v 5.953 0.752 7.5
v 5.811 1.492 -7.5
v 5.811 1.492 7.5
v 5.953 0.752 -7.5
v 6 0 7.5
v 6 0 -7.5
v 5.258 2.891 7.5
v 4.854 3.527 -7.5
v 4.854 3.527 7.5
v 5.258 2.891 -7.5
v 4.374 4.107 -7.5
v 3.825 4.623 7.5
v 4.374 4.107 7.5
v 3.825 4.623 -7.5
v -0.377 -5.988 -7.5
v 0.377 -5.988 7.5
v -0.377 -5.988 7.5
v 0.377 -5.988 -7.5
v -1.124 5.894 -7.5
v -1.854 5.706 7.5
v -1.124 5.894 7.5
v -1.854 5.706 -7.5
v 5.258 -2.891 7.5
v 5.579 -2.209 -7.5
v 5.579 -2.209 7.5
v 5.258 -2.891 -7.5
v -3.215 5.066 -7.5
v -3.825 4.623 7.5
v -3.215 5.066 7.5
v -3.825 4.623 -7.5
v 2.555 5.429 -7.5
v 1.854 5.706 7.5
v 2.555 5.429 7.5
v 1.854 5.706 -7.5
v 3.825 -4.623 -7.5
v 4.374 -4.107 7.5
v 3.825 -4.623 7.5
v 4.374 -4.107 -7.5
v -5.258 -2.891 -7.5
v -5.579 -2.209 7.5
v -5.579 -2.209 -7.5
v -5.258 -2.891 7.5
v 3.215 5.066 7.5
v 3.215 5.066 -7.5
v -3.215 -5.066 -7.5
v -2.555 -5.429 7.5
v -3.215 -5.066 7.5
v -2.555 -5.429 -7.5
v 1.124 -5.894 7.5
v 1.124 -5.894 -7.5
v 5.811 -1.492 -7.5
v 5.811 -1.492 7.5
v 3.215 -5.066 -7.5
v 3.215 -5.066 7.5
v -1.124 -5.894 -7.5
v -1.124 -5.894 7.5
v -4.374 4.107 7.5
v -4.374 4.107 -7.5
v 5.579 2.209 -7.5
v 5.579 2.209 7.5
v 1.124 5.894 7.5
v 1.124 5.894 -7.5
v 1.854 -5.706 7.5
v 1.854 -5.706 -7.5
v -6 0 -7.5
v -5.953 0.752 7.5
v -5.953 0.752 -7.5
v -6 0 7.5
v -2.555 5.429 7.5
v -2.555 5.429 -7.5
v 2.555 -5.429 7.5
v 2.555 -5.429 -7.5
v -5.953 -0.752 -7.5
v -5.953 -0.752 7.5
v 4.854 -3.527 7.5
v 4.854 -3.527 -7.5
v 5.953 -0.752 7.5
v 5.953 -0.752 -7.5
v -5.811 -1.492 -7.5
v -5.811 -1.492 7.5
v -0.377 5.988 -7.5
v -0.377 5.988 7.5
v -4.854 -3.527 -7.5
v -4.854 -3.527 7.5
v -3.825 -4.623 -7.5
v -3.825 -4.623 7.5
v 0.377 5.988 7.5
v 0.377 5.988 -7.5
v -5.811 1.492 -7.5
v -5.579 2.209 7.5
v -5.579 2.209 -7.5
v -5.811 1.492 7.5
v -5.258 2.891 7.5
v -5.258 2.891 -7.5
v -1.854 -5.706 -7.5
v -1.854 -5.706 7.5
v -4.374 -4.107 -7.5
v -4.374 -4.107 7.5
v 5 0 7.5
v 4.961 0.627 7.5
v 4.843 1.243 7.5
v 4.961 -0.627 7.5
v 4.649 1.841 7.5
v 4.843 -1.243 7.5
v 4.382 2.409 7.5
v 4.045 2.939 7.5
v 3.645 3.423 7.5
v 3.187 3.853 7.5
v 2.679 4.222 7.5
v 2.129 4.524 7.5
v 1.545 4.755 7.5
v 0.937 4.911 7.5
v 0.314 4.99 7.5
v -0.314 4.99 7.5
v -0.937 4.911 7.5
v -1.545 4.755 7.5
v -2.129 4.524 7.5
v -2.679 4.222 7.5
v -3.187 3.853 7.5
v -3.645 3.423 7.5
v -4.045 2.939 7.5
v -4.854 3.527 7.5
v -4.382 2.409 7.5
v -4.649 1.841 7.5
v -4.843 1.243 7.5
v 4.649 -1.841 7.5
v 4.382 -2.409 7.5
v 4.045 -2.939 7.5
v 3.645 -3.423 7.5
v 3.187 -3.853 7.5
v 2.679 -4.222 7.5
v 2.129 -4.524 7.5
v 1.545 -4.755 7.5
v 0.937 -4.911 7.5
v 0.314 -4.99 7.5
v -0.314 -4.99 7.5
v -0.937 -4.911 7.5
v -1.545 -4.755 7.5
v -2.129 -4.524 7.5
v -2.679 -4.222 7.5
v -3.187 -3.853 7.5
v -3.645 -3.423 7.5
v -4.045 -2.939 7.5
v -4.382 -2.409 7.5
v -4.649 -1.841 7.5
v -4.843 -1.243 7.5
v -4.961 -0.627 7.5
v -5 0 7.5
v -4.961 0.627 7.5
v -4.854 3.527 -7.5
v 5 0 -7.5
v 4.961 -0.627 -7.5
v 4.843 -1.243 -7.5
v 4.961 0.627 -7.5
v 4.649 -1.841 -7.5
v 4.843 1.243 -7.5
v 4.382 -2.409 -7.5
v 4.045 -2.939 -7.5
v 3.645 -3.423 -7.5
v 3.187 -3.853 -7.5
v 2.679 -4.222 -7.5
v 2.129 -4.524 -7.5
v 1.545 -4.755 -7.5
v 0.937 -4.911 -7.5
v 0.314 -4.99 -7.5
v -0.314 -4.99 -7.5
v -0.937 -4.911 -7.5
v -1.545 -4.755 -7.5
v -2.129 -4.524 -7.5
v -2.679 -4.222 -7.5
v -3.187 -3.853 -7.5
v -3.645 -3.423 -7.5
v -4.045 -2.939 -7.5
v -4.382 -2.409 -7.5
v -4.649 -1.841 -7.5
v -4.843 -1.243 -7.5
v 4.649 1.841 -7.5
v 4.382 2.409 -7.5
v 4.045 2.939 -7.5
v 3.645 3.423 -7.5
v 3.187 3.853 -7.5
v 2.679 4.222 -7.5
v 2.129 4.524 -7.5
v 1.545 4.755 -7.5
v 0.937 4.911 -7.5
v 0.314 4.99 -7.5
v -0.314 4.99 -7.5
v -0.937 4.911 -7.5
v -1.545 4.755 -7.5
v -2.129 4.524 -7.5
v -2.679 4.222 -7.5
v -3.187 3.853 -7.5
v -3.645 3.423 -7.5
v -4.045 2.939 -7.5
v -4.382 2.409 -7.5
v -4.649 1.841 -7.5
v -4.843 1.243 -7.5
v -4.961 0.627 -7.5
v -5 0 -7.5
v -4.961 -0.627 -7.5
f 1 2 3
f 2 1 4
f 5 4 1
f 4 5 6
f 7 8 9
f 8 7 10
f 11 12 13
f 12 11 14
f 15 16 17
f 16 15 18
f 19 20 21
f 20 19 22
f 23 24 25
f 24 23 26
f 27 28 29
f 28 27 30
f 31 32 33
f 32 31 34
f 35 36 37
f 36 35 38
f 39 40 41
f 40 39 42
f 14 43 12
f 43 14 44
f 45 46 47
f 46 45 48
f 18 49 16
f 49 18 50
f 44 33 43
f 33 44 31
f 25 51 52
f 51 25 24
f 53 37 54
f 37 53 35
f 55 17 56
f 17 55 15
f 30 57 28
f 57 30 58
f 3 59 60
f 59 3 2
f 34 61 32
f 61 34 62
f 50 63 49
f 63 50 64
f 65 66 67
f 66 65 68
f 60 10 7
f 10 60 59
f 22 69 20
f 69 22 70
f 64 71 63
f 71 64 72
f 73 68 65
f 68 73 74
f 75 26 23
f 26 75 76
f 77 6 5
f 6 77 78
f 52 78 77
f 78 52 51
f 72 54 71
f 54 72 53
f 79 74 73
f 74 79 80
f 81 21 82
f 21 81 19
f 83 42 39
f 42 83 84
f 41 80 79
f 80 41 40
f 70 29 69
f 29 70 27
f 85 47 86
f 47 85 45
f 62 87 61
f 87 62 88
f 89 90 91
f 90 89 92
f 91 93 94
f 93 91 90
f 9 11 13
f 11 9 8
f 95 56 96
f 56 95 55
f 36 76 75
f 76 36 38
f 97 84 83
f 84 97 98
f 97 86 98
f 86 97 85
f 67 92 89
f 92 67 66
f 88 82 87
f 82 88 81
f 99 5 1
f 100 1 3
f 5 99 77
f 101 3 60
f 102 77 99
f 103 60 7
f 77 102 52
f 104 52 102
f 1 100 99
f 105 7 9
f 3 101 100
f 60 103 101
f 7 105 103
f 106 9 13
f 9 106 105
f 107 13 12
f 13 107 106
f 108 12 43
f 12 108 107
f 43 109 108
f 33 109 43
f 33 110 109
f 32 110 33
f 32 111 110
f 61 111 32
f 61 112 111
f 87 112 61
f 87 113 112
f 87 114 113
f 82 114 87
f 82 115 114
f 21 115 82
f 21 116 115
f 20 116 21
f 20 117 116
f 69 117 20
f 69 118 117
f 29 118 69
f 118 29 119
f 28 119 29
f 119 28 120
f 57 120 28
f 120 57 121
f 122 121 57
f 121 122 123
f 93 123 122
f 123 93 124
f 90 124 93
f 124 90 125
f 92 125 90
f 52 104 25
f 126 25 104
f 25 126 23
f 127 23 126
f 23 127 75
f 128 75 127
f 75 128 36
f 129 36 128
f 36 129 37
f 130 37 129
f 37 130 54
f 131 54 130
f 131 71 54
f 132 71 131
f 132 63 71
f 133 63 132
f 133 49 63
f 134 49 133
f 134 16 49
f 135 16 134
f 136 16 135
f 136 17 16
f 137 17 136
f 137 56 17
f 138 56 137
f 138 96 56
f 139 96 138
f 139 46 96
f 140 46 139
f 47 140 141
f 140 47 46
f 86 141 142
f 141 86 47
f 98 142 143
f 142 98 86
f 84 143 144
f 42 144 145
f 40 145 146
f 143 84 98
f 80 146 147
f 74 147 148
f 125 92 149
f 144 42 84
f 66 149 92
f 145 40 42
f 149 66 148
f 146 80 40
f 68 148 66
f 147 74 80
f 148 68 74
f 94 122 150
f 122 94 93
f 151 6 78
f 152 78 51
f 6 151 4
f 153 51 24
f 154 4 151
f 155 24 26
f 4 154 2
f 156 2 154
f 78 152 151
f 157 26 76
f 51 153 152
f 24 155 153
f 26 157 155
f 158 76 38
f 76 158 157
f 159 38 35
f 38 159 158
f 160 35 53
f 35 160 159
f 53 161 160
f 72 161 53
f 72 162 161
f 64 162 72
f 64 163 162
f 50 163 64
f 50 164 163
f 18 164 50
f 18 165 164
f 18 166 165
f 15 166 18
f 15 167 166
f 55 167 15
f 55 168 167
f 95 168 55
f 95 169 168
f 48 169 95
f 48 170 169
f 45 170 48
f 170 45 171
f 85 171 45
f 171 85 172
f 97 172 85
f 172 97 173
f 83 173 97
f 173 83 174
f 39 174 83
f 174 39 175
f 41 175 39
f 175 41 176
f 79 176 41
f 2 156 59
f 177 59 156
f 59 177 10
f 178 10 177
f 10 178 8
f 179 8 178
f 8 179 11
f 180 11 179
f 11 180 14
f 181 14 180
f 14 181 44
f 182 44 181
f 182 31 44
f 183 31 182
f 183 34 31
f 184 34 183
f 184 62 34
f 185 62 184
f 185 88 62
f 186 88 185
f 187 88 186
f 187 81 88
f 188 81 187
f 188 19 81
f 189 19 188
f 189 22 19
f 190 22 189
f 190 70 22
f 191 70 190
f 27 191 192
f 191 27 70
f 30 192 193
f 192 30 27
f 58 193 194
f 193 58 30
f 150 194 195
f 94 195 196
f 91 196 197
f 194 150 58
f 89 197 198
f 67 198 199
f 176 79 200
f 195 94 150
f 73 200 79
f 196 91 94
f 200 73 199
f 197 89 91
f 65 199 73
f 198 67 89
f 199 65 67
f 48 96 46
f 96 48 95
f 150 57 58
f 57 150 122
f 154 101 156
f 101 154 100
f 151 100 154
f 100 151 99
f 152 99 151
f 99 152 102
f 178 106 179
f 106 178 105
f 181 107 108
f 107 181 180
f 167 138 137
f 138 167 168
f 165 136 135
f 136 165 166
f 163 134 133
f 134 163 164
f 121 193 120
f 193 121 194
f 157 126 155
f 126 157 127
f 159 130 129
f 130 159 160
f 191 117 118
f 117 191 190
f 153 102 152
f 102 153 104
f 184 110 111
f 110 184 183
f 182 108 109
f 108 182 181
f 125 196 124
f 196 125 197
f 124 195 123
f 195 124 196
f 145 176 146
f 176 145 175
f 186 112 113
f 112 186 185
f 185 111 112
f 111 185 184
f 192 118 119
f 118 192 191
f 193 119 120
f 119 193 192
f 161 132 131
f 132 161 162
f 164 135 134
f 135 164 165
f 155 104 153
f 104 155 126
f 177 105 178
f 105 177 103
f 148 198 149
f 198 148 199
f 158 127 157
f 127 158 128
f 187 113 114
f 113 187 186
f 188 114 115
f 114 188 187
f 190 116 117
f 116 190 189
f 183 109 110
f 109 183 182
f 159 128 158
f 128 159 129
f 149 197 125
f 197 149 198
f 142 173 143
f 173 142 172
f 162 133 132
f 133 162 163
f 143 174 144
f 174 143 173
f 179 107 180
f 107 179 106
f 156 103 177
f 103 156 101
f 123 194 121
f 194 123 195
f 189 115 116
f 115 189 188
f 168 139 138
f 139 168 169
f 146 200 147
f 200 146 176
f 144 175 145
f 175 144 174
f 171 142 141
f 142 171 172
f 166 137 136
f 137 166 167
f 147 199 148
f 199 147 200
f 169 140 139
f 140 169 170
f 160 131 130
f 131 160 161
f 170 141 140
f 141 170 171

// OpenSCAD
$fn = 50;


difference() {
	union() {
		translate(v = [0, 0, -7.5000000000]) {
			cylinder(h = 15, r = 6.0000000000);
		}
	}
	union() {
		translate(v = [0, 0, -100.0000000000]) {
			cylinder(h = 200, r = 5.0000000000);
		}
	}
}
